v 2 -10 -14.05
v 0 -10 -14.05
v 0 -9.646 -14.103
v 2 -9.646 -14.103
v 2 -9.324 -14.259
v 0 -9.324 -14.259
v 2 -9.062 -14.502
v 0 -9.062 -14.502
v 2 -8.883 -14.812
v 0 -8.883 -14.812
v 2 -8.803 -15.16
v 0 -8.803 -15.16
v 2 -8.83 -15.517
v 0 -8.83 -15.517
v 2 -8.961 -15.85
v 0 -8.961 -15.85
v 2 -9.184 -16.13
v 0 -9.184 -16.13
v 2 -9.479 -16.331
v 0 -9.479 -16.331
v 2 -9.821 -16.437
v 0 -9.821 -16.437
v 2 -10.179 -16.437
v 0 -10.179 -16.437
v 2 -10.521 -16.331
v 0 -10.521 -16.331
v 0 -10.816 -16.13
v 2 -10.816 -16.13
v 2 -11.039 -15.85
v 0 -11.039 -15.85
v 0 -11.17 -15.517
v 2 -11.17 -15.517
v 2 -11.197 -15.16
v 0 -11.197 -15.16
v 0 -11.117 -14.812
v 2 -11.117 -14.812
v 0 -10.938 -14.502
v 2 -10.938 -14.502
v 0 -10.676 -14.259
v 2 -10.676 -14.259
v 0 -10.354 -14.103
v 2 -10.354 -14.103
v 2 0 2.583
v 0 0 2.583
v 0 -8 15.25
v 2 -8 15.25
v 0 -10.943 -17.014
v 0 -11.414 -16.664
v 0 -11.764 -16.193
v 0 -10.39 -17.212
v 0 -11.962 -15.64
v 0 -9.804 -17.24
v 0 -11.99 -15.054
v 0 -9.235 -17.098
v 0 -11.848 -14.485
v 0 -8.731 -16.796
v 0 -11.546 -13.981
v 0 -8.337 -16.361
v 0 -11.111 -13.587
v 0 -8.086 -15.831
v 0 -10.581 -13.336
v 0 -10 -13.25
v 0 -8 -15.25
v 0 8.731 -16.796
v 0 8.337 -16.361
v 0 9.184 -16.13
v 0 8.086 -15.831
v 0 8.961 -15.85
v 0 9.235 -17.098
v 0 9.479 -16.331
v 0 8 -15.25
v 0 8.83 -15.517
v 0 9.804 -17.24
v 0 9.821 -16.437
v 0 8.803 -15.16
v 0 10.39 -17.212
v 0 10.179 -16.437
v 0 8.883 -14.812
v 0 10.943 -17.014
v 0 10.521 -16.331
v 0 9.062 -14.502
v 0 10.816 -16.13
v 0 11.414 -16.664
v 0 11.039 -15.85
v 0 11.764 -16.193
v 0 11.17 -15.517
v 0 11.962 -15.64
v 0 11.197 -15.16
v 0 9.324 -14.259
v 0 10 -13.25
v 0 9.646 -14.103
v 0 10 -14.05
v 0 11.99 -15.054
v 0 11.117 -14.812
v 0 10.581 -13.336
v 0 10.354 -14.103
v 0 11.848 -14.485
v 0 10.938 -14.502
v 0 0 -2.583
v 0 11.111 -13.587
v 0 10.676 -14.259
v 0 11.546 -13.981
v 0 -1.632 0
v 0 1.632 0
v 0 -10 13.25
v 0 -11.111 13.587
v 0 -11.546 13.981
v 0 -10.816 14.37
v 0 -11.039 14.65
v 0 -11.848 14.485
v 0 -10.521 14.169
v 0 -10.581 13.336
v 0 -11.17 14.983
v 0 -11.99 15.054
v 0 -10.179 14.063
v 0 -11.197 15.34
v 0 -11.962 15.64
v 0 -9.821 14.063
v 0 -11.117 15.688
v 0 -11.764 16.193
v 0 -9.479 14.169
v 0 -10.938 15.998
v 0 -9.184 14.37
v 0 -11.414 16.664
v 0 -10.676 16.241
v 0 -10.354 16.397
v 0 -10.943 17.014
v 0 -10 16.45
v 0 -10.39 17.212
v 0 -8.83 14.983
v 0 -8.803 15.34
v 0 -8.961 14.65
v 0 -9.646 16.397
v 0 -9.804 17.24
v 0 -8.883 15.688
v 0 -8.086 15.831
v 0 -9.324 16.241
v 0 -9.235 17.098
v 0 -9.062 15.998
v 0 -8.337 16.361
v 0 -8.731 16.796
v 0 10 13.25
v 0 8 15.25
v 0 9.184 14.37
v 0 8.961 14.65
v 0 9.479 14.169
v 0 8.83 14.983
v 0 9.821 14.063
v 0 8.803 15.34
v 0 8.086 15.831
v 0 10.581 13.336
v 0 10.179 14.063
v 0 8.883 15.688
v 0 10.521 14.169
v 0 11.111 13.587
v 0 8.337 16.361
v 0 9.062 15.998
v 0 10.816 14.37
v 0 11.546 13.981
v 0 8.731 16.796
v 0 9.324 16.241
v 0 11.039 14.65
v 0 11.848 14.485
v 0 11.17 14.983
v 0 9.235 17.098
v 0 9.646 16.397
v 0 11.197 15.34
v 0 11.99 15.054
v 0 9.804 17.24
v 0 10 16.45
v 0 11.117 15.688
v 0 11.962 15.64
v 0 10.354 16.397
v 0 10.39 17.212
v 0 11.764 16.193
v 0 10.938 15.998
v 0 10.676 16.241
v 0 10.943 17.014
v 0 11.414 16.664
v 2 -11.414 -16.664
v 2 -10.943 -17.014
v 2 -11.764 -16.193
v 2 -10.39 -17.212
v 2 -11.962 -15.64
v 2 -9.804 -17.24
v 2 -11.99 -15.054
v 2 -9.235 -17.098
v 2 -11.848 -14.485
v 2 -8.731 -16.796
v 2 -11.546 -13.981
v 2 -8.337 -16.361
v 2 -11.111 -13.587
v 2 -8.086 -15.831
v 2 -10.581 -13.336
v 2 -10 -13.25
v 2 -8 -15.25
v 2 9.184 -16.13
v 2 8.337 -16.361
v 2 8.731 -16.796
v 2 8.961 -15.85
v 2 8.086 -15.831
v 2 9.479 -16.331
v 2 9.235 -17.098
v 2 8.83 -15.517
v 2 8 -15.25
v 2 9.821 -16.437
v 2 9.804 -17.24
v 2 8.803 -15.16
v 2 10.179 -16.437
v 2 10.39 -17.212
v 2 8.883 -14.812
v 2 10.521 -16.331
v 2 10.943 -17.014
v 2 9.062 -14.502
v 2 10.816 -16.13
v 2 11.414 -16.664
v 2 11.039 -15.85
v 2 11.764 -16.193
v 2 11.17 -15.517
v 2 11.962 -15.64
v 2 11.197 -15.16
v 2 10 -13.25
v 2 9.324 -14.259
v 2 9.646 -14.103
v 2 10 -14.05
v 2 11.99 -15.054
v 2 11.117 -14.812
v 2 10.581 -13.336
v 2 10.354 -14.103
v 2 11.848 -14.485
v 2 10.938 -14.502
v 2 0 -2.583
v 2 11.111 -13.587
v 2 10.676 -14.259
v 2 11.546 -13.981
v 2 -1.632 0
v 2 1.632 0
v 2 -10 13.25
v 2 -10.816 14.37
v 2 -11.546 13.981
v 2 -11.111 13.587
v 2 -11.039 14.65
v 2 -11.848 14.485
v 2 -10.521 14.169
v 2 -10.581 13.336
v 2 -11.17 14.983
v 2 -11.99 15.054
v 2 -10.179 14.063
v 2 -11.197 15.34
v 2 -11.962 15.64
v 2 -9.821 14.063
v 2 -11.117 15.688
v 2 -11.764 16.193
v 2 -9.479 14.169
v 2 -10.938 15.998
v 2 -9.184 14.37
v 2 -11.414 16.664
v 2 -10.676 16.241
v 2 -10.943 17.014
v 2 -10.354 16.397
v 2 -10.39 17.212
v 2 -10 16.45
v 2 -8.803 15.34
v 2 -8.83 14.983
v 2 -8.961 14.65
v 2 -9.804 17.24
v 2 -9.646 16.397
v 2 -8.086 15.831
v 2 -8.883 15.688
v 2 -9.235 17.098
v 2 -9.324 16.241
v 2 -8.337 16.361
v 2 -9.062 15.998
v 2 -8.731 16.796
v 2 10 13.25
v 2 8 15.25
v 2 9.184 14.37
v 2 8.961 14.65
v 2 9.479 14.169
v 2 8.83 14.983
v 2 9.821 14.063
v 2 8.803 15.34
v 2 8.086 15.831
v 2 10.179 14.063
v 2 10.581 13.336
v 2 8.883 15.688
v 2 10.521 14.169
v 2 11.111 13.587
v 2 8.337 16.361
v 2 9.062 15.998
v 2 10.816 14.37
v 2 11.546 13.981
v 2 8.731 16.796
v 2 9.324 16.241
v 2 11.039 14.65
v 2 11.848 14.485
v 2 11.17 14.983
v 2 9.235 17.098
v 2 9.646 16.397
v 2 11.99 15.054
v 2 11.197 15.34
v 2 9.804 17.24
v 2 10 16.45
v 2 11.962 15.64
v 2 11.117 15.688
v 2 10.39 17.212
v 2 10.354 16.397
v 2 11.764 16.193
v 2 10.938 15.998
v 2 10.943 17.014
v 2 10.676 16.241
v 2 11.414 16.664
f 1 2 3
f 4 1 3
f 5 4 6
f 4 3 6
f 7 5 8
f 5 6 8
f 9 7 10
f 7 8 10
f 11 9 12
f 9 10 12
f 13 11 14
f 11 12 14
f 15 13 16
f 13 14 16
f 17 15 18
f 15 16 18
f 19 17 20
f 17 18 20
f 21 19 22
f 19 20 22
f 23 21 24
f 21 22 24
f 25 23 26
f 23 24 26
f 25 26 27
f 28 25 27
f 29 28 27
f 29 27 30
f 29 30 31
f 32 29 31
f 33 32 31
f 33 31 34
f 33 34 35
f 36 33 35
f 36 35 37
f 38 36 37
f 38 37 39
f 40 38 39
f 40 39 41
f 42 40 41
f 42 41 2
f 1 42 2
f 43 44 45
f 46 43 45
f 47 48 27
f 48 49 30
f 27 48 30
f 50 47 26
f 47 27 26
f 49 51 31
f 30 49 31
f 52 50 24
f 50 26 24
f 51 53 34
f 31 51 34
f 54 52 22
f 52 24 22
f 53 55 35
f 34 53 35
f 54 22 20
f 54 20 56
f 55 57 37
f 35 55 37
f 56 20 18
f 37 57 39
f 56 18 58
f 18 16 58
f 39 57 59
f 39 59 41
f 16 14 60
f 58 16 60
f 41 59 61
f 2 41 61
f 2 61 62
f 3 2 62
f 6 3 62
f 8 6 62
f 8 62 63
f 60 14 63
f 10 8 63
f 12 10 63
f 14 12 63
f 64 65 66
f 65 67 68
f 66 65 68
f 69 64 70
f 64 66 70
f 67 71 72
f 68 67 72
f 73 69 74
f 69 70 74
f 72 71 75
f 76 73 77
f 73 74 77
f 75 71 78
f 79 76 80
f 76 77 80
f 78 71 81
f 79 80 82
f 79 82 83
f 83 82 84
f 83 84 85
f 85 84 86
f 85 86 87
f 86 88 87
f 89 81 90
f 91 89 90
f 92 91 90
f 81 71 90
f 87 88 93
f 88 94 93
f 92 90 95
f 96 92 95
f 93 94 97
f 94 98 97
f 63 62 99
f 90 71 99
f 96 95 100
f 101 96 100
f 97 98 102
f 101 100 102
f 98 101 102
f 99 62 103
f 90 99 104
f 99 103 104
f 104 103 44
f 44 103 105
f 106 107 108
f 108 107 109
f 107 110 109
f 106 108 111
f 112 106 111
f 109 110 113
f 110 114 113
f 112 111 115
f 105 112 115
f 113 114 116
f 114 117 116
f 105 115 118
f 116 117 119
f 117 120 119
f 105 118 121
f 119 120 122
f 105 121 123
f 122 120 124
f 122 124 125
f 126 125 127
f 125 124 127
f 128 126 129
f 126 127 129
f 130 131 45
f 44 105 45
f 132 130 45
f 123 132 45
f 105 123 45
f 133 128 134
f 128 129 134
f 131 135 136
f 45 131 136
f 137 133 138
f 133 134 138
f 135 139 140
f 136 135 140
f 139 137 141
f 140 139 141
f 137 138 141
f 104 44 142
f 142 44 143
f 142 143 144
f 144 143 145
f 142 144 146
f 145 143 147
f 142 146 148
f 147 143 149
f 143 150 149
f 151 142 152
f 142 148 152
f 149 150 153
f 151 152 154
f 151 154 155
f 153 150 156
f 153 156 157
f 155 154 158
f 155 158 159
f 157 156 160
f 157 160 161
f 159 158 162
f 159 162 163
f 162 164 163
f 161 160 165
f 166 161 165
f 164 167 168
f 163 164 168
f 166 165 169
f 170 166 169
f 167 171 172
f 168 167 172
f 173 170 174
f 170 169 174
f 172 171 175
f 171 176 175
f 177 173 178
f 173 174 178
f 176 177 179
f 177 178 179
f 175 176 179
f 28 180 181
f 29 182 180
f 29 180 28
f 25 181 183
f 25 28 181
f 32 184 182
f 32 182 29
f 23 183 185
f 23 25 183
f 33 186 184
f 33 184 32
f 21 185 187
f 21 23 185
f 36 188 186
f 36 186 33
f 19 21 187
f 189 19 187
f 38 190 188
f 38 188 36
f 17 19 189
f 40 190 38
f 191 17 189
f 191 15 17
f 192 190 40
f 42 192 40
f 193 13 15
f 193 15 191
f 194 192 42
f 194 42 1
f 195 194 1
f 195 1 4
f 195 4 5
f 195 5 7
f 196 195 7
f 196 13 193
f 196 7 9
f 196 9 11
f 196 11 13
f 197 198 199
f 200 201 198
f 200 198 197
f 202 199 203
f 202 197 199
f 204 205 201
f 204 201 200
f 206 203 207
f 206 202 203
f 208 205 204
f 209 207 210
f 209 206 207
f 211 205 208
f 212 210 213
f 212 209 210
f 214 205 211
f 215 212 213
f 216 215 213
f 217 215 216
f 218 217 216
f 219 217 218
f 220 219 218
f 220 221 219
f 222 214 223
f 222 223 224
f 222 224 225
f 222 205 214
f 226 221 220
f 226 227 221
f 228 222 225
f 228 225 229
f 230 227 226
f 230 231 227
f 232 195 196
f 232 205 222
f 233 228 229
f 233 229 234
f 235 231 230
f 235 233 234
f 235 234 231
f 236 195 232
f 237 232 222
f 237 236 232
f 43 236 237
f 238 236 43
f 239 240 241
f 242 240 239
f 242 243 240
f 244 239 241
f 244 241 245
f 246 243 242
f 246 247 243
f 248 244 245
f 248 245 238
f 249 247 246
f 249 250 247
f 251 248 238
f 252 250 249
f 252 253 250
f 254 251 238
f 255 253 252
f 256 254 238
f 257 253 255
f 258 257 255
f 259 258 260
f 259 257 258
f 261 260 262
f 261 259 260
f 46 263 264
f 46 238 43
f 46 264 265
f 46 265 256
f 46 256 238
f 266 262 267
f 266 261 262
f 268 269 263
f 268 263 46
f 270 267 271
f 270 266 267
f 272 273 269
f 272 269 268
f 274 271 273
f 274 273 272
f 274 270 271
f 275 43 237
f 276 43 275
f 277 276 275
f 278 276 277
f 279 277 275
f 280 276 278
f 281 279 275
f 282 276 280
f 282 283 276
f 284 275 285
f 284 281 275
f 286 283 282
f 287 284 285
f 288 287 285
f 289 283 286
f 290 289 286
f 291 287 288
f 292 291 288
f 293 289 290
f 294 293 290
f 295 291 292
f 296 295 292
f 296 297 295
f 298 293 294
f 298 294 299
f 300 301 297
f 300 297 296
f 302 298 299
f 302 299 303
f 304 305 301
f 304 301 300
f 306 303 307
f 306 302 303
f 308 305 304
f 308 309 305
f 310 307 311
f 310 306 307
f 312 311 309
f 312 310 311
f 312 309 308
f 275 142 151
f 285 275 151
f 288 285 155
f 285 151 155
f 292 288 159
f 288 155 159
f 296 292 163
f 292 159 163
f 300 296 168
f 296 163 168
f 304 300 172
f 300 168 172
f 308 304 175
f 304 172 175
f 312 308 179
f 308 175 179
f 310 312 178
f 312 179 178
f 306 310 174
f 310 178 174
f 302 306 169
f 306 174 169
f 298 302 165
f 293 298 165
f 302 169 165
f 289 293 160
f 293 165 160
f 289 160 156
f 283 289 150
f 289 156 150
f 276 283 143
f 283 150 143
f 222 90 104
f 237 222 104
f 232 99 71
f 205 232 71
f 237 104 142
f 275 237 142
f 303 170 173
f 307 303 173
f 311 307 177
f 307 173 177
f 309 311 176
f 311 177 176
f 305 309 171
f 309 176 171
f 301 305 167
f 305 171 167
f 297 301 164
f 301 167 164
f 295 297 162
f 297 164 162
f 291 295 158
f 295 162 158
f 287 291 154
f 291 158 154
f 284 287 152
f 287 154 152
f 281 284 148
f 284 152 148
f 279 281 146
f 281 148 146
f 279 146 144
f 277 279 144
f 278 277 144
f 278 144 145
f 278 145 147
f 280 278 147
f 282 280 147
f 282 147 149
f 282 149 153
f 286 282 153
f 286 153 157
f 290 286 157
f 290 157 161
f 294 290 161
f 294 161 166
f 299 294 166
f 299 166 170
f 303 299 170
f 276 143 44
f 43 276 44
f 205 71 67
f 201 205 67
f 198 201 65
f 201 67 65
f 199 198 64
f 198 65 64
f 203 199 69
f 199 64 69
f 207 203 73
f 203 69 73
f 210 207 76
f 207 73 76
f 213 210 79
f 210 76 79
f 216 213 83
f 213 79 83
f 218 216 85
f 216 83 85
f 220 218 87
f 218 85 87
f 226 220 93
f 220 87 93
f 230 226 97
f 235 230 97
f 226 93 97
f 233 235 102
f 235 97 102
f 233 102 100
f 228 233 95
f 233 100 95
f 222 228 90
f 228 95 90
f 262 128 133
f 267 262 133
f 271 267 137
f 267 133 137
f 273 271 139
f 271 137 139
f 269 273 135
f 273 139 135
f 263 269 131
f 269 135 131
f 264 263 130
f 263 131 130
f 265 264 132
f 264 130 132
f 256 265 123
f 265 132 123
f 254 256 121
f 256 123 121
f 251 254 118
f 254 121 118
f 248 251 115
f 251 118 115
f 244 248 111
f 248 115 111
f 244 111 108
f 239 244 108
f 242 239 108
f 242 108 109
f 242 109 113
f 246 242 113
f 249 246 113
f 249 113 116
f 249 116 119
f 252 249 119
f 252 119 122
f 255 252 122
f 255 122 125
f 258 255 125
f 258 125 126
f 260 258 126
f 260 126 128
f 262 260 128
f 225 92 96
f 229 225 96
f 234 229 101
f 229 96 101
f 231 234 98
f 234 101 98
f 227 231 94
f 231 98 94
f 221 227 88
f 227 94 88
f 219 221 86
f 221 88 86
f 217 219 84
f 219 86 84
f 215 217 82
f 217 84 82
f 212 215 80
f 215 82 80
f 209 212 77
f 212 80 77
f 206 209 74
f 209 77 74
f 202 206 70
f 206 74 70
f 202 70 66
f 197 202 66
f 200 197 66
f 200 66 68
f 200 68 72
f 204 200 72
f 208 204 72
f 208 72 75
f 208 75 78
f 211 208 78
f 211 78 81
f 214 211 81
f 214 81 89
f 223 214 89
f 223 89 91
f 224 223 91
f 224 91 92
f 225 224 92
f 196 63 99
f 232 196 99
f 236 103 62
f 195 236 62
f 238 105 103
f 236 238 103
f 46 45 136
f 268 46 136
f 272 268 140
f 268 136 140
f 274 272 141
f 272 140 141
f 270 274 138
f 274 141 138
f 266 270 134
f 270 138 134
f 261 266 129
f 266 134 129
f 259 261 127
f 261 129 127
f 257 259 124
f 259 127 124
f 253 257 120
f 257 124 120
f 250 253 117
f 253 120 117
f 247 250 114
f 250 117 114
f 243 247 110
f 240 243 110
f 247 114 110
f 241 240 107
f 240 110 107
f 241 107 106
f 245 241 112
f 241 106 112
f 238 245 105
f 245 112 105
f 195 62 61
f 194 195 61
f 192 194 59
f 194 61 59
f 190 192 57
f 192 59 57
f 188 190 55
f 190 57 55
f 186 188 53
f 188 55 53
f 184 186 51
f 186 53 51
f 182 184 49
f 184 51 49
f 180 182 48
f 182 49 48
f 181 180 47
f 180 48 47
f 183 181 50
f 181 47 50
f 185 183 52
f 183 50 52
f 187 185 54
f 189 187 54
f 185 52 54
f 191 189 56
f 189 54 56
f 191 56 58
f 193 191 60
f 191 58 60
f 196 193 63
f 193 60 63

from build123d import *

# Parameters (mm, degrees)
BOSS_EXTRUDE1_DEPTH  = 2
M2_CLEARANCE_HOLE1_D = 2.4


with BuildPart() as part:
    # Sketch1 → Boss-Extrude1 (new body)
    with BuildSketch(Plane.YZ):
        with BuildLine():
            Line((-10, 13.25), (-1.631578947, 0))
            Line((-1.631578947, 0), (-10, -13.25))
            ThreePointArc((-10, -13.25), (-11.414213562, -16.664213562), (-8, -15.25))
            Line((-8, -15.25), (0, -2.583333333))
            Line((0, -2.583333333), (8, -15.25))
            ThreePointArc((8, -15.25), (11.414213562, -16.664213562), (10, -13.25))
            Line((10, -13.25), (1.631578947, 0))
            Line((1.631578947, 0), (10, 13.25))
            ThreePointArc((10, 13.25), (11.414213562, 16.664213562), (8, 15.25))
            Line((8, 15.25), (0, 2.583333333))
            Line((0, 2.583333333), (-8, 15.25))
            ThreePointArc((-8, 15.25), (-11.414213562, 16.664213562), (-10, 13.25))
        make_face()
    extrude(amount=BOSS_EXTRUDE1_DEPTH)

    # M2 Clearance Hole1 (through all)
    with Locations(Plane(origin=(2, 0, 0), x_dir=(0, 0, -1), z_dir=(1, 0, 0))):
        with Locations((15.25, 10), (15.25, -10), (-15.25, 10), (-15.25, -10)):
            Hole(M2_CLEARANCE_HOLE1_D / 2)


solid = part.part
